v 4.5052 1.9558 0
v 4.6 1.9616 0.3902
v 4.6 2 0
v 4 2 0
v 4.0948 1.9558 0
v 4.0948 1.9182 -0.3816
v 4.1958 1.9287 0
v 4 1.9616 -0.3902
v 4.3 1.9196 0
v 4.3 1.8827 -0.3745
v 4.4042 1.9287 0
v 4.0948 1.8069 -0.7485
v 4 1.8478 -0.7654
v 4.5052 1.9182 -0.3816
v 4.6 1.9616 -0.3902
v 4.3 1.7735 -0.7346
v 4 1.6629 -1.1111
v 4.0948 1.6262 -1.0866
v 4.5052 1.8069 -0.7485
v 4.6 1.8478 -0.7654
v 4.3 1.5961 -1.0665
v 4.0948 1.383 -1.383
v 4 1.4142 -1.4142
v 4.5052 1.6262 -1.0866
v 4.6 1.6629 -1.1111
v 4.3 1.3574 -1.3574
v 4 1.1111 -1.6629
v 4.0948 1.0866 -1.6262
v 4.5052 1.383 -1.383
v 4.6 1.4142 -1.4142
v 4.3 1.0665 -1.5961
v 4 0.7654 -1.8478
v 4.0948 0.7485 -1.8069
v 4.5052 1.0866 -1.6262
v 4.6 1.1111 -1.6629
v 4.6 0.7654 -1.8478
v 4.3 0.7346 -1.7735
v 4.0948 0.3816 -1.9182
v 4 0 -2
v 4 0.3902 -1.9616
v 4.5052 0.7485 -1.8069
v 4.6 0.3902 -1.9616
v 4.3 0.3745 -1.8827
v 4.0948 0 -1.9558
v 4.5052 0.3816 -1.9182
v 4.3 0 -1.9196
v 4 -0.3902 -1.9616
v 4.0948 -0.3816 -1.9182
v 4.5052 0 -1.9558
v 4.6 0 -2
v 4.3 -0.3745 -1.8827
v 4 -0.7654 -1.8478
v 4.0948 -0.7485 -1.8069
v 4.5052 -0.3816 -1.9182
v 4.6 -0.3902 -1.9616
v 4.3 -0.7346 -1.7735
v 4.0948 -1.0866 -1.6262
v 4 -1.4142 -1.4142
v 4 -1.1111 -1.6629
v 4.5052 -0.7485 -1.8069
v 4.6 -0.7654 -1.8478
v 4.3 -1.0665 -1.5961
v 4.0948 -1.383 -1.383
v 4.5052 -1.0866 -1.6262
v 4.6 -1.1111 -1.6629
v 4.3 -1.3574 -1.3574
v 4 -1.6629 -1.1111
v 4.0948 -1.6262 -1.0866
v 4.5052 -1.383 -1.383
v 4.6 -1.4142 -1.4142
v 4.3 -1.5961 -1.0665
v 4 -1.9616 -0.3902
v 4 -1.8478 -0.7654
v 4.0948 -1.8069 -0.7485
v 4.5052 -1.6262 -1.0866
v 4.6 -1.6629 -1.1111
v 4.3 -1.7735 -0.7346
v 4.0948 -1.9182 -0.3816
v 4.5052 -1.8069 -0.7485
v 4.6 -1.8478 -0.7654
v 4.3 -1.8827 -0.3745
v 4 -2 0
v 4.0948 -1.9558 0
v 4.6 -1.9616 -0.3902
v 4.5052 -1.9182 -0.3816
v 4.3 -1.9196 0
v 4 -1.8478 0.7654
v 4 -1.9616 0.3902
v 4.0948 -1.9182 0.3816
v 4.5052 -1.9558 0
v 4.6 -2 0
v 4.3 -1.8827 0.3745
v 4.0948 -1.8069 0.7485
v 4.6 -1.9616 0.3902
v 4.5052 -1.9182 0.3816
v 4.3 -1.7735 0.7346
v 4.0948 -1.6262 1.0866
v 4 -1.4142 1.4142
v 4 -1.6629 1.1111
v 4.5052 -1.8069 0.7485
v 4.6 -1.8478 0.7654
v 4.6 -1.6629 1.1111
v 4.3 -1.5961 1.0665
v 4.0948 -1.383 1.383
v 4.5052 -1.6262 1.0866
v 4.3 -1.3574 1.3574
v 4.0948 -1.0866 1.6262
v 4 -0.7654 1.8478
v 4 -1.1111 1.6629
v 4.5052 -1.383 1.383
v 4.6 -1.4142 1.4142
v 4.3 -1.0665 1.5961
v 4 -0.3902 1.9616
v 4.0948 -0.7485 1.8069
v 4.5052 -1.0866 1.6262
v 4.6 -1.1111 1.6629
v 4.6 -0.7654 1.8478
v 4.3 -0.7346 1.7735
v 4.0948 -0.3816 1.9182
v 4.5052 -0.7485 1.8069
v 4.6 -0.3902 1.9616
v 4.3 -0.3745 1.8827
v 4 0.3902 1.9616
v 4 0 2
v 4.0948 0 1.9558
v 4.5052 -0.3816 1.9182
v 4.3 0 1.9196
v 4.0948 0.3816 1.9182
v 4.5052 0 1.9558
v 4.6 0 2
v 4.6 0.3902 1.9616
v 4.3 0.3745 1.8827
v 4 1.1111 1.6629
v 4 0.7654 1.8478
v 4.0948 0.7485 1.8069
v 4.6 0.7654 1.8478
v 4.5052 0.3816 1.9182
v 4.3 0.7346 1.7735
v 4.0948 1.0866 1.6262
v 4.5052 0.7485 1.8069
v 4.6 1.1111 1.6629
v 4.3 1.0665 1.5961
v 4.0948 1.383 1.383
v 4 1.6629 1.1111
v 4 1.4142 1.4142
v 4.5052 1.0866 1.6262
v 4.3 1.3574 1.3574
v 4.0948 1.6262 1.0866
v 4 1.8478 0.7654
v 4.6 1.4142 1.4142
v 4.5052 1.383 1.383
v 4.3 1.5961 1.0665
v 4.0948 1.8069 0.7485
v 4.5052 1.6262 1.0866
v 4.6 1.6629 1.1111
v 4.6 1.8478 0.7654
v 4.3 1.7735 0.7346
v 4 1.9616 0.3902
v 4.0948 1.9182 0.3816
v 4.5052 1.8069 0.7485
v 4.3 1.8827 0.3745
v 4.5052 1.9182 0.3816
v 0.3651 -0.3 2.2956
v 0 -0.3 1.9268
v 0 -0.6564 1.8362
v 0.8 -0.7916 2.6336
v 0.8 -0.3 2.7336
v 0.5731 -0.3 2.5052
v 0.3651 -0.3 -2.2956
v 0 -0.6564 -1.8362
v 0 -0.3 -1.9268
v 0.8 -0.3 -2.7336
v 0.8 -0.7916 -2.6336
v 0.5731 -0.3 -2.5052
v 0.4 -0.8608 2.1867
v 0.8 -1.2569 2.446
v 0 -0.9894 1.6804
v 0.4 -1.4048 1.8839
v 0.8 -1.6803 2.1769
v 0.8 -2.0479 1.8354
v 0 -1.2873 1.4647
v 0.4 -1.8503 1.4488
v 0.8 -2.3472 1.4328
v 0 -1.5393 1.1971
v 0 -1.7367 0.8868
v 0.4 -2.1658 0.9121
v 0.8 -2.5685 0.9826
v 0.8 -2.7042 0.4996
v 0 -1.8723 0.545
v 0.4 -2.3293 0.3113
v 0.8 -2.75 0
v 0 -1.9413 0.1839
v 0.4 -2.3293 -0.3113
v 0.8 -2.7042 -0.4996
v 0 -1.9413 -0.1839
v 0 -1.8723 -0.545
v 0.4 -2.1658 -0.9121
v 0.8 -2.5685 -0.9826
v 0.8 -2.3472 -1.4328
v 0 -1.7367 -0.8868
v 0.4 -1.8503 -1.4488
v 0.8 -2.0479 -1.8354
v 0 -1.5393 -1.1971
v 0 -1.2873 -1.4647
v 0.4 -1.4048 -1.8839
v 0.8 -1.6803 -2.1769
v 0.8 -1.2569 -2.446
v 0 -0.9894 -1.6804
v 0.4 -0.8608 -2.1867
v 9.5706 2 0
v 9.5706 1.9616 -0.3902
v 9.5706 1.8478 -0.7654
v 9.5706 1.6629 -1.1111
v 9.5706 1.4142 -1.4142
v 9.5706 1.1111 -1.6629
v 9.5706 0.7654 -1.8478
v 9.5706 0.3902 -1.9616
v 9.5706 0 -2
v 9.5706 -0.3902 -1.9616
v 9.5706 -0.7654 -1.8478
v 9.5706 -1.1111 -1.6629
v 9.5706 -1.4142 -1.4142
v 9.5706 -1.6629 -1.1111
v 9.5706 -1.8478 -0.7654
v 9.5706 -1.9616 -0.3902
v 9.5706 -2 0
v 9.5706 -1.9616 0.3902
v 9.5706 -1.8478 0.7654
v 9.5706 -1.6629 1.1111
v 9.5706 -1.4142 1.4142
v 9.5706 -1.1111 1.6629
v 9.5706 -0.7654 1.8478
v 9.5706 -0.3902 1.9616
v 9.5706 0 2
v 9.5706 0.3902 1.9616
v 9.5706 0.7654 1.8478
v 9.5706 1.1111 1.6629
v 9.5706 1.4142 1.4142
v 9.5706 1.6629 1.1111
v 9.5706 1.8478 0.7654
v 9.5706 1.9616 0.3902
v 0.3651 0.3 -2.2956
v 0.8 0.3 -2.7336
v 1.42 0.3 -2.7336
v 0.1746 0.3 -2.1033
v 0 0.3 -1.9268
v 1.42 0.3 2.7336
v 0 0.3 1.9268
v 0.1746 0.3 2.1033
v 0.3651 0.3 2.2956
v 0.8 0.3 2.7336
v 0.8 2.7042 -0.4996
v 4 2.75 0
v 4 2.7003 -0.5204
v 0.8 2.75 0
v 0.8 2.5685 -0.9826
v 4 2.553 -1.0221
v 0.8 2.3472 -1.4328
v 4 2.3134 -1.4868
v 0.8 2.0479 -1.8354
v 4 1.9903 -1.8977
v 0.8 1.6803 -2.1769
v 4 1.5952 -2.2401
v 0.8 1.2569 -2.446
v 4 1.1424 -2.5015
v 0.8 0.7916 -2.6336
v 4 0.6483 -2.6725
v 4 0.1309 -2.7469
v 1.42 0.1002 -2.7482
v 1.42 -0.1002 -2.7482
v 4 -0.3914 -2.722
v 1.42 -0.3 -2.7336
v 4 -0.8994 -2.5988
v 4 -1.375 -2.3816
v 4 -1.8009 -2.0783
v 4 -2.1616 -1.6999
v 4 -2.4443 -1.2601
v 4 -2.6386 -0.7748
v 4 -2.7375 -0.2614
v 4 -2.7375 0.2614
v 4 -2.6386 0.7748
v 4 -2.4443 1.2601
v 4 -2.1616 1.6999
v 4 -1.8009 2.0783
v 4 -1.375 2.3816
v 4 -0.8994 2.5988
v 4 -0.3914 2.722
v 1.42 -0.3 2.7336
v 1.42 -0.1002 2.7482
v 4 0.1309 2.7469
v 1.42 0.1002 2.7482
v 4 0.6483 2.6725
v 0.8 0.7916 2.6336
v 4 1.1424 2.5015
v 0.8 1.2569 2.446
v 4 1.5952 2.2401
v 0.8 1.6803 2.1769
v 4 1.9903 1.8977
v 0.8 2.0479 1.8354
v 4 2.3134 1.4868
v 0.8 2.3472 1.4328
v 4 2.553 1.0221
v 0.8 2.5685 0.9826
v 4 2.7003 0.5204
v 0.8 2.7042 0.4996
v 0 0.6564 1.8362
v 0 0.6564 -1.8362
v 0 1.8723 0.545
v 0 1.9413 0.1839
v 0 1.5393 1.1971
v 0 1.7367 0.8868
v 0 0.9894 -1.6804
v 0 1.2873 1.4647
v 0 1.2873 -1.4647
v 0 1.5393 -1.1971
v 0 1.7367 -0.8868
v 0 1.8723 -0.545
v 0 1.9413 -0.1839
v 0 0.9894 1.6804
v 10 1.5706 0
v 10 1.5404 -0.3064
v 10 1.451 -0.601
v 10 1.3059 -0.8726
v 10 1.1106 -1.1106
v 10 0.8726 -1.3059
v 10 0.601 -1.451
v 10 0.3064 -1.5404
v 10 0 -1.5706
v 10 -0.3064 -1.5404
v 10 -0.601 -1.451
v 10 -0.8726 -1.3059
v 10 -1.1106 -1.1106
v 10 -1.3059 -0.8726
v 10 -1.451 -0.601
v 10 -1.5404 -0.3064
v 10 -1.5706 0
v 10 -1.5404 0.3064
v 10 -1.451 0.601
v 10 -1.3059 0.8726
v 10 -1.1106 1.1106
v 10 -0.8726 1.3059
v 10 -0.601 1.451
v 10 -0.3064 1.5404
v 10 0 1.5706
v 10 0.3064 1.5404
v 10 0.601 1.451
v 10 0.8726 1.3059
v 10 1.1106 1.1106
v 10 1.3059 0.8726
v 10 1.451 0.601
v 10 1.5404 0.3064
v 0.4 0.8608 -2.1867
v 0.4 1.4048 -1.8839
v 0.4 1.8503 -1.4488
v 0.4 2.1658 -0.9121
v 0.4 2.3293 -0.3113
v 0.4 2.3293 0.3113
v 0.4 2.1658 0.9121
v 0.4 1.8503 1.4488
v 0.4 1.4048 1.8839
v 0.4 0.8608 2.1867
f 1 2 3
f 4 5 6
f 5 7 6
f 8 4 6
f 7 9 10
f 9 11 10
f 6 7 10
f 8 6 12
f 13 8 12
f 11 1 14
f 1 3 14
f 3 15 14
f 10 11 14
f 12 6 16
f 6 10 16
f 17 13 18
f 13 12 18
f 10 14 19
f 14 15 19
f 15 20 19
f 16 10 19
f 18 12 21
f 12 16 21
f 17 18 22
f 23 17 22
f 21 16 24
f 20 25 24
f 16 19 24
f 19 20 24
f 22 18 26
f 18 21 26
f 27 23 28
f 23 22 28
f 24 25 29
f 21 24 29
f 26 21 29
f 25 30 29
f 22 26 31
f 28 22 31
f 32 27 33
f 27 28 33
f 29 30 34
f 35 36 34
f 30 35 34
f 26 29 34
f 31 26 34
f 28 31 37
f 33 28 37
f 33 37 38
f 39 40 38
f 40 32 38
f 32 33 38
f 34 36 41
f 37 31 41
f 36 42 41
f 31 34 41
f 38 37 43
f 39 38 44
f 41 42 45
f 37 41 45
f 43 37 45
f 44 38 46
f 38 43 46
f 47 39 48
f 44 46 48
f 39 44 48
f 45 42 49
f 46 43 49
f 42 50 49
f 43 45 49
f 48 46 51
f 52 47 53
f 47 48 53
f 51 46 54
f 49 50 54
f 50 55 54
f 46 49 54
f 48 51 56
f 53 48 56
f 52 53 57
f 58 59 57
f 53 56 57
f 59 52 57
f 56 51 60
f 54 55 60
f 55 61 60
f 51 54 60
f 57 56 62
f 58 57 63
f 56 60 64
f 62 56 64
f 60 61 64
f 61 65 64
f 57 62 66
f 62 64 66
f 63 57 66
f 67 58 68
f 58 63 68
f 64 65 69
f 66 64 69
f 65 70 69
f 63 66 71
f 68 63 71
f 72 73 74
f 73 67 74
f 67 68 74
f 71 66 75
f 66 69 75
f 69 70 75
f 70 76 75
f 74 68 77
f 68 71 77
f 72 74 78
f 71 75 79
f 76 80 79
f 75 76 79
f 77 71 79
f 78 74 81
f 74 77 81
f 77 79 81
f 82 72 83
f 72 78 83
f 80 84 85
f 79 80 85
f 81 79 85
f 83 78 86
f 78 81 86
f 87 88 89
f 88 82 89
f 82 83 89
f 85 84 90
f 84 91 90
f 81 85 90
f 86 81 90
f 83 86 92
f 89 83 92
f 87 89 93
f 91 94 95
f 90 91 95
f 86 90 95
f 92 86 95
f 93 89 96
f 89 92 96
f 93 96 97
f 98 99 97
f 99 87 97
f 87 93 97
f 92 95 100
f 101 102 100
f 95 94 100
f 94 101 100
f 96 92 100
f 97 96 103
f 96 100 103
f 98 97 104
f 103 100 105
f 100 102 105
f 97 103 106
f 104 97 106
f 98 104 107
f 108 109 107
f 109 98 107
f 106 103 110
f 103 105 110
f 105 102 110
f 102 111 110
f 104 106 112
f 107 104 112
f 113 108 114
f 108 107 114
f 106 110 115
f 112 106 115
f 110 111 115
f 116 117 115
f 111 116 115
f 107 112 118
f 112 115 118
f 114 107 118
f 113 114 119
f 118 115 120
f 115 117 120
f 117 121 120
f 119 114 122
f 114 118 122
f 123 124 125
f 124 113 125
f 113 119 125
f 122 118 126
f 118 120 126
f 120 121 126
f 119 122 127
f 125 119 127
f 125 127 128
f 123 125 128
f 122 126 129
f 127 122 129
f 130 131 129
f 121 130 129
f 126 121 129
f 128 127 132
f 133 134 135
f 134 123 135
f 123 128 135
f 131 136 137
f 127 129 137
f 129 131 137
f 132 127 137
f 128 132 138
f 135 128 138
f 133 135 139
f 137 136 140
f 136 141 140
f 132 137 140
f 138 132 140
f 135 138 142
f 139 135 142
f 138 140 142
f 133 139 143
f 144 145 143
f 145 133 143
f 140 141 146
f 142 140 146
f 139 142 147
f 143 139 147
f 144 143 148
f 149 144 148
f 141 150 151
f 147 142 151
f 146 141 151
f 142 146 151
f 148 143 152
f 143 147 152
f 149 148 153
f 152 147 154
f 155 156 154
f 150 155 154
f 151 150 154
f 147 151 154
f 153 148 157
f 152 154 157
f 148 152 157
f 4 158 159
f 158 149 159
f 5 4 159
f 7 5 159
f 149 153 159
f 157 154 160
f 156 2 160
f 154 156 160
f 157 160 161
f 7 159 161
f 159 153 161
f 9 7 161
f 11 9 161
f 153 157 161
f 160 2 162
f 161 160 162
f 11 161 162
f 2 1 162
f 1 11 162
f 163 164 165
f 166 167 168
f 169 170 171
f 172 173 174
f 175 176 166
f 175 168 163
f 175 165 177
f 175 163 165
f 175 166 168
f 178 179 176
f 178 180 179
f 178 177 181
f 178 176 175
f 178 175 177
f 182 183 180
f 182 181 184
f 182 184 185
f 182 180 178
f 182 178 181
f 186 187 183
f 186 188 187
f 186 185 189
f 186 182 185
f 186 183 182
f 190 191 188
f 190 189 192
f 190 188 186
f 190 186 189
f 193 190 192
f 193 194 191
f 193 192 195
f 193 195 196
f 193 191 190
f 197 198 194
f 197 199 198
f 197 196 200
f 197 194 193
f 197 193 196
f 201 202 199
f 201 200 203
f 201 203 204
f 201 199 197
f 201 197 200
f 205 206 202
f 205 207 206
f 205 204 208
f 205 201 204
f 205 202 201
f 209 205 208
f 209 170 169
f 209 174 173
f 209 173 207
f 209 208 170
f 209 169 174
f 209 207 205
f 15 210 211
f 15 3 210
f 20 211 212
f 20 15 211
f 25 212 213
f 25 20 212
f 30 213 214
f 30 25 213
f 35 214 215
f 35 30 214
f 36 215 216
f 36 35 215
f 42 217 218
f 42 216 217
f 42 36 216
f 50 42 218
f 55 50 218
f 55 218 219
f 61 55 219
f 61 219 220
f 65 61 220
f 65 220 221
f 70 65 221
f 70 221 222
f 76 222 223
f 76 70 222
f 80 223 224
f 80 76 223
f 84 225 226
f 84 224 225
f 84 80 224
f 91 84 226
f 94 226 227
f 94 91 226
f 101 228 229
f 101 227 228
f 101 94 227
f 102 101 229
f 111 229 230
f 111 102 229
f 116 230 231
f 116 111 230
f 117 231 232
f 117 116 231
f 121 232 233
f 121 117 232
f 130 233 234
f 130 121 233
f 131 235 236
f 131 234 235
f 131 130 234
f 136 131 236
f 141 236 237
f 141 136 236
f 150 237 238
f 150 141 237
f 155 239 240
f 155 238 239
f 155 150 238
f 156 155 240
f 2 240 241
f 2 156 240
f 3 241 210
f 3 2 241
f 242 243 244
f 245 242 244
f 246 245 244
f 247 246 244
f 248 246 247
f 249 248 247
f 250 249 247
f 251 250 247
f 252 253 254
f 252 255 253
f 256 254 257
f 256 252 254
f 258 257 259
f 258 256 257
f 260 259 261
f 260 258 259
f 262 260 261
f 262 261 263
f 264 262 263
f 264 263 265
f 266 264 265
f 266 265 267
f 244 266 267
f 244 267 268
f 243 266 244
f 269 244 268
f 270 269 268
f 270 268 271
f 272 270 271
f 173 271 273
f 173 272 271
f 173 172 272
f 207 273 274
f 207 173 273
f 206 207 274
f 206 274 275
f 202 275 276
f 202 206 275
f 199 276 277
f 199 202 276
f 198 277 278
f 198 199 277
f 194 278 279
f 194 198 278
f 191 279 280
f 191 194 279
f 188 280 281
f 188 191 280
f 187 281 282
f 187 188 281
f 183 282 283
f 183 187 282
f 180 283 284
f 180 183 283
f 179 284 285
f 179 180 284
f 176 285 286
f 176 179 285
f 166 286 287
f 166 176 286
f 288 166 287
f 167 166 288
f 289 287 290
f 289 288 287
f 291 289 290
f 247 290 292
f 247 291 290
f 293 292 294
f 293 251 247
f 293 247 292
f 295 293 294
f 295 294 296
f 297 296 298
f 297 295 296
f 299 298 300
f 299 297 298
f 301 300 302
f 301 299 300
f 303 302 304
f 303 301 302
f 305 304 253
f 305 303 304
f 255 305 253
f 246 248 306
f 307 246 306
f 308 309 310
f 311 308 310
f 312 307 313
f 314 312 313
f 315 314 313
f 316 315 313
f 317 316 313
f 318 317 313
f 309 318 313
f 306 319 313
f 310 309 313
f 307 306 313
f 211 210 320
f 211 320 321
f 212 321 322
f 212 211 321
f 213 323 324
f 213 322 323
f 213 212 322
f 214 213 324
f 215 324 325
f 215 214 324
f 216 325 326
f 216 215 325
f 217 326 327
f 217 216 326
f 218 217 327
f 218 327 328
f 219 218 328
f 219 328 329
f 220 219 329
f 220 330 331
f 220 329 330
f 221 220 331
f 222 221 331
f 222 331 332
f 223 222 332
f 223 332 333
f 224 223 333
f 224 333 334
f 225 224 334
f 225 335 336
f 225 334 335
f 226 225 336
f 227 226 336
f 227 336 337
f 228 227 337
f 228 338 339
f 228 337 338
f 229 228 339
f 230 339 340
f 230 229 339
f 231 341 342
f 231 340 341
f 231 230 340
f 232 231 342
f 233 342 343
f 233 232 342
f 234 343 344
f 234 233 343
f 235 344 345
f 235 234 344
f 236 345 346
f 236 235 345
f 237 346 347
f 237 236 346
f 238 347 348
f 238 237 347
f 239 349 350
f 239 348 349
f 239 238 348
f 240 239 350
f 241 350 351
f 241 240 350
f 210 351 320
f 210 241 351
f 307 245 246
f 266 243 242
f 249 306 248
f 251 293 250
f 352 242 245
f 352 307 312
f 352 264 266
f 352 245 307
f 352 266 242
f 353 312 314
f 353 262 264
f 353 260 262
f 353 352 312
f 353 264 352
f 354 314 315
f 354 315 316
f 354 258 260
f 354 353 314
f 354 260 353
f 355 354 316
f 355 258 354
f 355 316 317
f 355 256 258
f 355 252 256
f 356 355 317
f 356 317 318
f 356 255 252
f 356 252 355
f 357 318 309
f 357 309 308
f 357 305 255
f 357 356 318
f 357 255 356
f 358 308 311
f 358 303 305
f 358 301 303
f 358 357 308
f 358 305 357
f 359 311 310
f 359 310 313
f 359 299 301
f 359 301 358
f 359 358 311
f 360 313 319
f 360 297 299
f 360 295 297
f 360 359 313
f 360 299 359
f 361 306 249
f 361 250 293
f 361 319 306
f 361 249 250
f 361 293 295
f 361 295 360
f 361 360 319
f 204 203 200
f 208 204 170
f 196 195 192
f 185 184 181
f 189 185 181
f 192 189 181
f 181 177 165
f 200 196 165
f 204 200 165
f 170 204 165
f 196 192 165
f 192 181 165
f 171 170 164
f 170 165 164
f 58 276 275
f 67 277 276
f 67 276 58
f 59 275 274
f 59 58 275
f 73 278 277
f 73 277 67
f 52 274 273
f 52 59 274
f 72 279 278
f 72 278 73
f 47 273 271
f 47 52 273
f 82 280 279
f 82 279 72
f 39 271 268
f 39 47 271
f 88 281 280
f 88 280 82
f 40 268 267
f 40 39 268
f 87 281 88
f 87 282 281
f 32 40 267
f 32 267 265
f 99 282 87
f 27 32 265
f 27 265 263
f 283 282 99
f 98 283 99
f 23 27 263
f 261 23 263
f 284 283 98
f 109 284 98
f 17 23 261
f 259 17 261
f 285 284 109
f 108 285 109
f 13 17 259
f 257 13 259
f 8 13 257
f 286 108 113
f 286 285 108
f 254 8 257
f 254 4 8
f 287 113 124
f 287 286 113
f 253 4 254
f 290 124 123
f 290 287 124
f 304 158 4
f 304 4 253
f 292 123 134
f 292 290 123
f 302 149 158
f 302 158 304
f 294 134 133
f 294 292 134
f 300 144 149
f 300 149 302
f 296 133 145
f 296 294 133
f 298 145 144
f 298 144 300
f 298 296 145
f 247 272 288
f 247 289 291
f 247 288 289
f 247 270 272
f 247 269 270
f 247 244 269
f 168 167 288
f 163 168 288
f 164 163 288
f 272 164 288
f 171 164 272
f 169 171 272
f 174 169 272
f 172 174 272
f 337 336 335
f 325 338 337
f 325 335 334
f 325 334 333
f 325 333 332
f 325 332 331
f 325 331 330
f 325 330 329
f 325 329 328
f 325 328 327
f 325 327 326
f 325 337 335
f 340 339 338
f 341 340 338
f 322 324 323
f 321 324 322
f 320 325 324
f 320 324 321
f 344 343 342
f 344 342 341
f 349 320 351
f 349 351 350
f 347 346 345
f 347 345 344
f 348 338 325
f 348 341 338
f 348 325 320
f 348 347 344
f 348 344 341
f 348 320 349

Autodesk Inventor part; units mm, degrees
ref_plane "YZ Plane" through (0, 0, 0) normal (1, 0, 0) x (0, 1, 0)
ref_plane "XZ Plane" through (0, 0, 0) normal (0, 1, 0) x (-1, 0, 0)
sketch "Skizze1" plane through (0, 0, 0) normal (0, 0, 1) x (1, 0, 0)
  line L0 (0, 0) -> (10, 0)
  line L1 (10, 0) -> (10, 2)
  line L2 (10, 2) -> (4, 2)
  line L3 (4, 2) -> (4, 2.75)
  line L4 (4, 2.75) -> (0, 2.75)
  line L5 (0, 2.75) -> (0, 0)
  line L6 (-2, 0) -> (12, 0) projected
  line L7 (0, -0.55) -> (0, 3.3) projected
  arc A0 (4, 2) -> (4.6, 2) centre (4.3, 2.5196) ccw
  dimension "d0" = 4
  dimension "d1" = 6
  dimension "d2" = 4
  dimension "d3" = 5.5
  dimension "d14" = 0.6
  dimension "d15" = 0.6
revolve "Körper" add sketch "Skizze1" angle 360 about axis through (0, 0, 0) along (1, 0, 0)
sketch "Skizze2" plane through (0, 0, 0) normal (-1, 0, 0) x (0, 0, 1)
  circle A0 centre (0, 0) radius 2.75 projected
  line L0 (0, -3.85) -> (0, 3.85) projected
  line L1 (-3.85, 0) -> (3.85, 0) projected
  line L2 (-2.75, 0.3) -> (2.75, 0.3)
  line L3 (2.75, 0.3) -> (2.75, -0.3)
  line L4 (2.75, -0.3) -> (-2.75, -0.3)
  line L5 (-2.75, -0.3) -> (-2.75, 0.3)
  line L6 (-2.75, 0) -> (2.75, 0) construction
  line L7 (0, 0.3) -> (0, -0.3) construction
  dimension "d5" = 0.6
extrude "Loch" cut sketch "Skizze2" against normal blind 1.42 contours L1 L0 L2 A0 | L3 L4 A0 | A0 L4 L0 L1 | A0 L2 L3 | L1 A0 L2 L0 | L0 L4 A0 L1 | L5 L2 A0 | A0 L4 L5
chamfer "Fase1" distance 0.8 angle 45 3 edges at (0, 2.0479, -1.8354) (0, 2.0479, 1.8354) (0, -2.75, 0) measured on face at (1.8067, 0.7465, 2.6467)
thread "Gewinde" size "M4x0.7" class "6g" standard "ISO Metric profile" length 6
chamfer "Fase2" distance 0.4294 distance2 0.4294 1 edges at (10, -2, 0) measured on face at (10, -0.499, -0.4421)
revolve "Nut1" cut sketch "Skizze1" angle 360 about axis through (0, 0, 0) along (1, 0, 0) contours A0 L2
ref_plane "Work Plane1" through (8, 0, 0) normal (0, 0, -1) x (1, 0, 0)
equation "\"d0\" = KOH"
equation "\"d1\" = GEL"
equation "\"d2\" = NND"
equation "\"d3\" = KOD"
equation "\"d14\" = SBR"
equation "\"d15\" = SBR"
equation "\"d5\" = SBR"
equation "\"d6\" = STI"
equation "\"d8\" = PHH"
equation "\"d19\" = PHH"
equation "\"d10\" = GEL"
equation "\"d12\" = -0.5 * GD1 + 0.5 * NND"
equation "\"d13\" = GUL"
equation "\"NND\" = 4"
equation "\"GEL\" = 6"
equation "\"KOD\" = 5.5"
equation "\"KOH\" = 4"
equation "\"SBR\" = 0.6"
equation "\"GUL\" = 0.61345 * PTC"
equation "\"PHH\" = 0.8"
equation "\"GD1\" = THREADDIA - 1.2269 * PTC"
equation "\"STI\" = 1.42"
equation "\"THREADDIA\" = 4"
equation "\"TOA\" = 30deg"
equation "\"NLG\" = GEL"
equation "\"PTC\" = 0.7"
equation "\"GAL\" = 0.61345 * PTC"
properties part number "DIN 927 - M4 x 4-14H" material "Stahl, weich"
